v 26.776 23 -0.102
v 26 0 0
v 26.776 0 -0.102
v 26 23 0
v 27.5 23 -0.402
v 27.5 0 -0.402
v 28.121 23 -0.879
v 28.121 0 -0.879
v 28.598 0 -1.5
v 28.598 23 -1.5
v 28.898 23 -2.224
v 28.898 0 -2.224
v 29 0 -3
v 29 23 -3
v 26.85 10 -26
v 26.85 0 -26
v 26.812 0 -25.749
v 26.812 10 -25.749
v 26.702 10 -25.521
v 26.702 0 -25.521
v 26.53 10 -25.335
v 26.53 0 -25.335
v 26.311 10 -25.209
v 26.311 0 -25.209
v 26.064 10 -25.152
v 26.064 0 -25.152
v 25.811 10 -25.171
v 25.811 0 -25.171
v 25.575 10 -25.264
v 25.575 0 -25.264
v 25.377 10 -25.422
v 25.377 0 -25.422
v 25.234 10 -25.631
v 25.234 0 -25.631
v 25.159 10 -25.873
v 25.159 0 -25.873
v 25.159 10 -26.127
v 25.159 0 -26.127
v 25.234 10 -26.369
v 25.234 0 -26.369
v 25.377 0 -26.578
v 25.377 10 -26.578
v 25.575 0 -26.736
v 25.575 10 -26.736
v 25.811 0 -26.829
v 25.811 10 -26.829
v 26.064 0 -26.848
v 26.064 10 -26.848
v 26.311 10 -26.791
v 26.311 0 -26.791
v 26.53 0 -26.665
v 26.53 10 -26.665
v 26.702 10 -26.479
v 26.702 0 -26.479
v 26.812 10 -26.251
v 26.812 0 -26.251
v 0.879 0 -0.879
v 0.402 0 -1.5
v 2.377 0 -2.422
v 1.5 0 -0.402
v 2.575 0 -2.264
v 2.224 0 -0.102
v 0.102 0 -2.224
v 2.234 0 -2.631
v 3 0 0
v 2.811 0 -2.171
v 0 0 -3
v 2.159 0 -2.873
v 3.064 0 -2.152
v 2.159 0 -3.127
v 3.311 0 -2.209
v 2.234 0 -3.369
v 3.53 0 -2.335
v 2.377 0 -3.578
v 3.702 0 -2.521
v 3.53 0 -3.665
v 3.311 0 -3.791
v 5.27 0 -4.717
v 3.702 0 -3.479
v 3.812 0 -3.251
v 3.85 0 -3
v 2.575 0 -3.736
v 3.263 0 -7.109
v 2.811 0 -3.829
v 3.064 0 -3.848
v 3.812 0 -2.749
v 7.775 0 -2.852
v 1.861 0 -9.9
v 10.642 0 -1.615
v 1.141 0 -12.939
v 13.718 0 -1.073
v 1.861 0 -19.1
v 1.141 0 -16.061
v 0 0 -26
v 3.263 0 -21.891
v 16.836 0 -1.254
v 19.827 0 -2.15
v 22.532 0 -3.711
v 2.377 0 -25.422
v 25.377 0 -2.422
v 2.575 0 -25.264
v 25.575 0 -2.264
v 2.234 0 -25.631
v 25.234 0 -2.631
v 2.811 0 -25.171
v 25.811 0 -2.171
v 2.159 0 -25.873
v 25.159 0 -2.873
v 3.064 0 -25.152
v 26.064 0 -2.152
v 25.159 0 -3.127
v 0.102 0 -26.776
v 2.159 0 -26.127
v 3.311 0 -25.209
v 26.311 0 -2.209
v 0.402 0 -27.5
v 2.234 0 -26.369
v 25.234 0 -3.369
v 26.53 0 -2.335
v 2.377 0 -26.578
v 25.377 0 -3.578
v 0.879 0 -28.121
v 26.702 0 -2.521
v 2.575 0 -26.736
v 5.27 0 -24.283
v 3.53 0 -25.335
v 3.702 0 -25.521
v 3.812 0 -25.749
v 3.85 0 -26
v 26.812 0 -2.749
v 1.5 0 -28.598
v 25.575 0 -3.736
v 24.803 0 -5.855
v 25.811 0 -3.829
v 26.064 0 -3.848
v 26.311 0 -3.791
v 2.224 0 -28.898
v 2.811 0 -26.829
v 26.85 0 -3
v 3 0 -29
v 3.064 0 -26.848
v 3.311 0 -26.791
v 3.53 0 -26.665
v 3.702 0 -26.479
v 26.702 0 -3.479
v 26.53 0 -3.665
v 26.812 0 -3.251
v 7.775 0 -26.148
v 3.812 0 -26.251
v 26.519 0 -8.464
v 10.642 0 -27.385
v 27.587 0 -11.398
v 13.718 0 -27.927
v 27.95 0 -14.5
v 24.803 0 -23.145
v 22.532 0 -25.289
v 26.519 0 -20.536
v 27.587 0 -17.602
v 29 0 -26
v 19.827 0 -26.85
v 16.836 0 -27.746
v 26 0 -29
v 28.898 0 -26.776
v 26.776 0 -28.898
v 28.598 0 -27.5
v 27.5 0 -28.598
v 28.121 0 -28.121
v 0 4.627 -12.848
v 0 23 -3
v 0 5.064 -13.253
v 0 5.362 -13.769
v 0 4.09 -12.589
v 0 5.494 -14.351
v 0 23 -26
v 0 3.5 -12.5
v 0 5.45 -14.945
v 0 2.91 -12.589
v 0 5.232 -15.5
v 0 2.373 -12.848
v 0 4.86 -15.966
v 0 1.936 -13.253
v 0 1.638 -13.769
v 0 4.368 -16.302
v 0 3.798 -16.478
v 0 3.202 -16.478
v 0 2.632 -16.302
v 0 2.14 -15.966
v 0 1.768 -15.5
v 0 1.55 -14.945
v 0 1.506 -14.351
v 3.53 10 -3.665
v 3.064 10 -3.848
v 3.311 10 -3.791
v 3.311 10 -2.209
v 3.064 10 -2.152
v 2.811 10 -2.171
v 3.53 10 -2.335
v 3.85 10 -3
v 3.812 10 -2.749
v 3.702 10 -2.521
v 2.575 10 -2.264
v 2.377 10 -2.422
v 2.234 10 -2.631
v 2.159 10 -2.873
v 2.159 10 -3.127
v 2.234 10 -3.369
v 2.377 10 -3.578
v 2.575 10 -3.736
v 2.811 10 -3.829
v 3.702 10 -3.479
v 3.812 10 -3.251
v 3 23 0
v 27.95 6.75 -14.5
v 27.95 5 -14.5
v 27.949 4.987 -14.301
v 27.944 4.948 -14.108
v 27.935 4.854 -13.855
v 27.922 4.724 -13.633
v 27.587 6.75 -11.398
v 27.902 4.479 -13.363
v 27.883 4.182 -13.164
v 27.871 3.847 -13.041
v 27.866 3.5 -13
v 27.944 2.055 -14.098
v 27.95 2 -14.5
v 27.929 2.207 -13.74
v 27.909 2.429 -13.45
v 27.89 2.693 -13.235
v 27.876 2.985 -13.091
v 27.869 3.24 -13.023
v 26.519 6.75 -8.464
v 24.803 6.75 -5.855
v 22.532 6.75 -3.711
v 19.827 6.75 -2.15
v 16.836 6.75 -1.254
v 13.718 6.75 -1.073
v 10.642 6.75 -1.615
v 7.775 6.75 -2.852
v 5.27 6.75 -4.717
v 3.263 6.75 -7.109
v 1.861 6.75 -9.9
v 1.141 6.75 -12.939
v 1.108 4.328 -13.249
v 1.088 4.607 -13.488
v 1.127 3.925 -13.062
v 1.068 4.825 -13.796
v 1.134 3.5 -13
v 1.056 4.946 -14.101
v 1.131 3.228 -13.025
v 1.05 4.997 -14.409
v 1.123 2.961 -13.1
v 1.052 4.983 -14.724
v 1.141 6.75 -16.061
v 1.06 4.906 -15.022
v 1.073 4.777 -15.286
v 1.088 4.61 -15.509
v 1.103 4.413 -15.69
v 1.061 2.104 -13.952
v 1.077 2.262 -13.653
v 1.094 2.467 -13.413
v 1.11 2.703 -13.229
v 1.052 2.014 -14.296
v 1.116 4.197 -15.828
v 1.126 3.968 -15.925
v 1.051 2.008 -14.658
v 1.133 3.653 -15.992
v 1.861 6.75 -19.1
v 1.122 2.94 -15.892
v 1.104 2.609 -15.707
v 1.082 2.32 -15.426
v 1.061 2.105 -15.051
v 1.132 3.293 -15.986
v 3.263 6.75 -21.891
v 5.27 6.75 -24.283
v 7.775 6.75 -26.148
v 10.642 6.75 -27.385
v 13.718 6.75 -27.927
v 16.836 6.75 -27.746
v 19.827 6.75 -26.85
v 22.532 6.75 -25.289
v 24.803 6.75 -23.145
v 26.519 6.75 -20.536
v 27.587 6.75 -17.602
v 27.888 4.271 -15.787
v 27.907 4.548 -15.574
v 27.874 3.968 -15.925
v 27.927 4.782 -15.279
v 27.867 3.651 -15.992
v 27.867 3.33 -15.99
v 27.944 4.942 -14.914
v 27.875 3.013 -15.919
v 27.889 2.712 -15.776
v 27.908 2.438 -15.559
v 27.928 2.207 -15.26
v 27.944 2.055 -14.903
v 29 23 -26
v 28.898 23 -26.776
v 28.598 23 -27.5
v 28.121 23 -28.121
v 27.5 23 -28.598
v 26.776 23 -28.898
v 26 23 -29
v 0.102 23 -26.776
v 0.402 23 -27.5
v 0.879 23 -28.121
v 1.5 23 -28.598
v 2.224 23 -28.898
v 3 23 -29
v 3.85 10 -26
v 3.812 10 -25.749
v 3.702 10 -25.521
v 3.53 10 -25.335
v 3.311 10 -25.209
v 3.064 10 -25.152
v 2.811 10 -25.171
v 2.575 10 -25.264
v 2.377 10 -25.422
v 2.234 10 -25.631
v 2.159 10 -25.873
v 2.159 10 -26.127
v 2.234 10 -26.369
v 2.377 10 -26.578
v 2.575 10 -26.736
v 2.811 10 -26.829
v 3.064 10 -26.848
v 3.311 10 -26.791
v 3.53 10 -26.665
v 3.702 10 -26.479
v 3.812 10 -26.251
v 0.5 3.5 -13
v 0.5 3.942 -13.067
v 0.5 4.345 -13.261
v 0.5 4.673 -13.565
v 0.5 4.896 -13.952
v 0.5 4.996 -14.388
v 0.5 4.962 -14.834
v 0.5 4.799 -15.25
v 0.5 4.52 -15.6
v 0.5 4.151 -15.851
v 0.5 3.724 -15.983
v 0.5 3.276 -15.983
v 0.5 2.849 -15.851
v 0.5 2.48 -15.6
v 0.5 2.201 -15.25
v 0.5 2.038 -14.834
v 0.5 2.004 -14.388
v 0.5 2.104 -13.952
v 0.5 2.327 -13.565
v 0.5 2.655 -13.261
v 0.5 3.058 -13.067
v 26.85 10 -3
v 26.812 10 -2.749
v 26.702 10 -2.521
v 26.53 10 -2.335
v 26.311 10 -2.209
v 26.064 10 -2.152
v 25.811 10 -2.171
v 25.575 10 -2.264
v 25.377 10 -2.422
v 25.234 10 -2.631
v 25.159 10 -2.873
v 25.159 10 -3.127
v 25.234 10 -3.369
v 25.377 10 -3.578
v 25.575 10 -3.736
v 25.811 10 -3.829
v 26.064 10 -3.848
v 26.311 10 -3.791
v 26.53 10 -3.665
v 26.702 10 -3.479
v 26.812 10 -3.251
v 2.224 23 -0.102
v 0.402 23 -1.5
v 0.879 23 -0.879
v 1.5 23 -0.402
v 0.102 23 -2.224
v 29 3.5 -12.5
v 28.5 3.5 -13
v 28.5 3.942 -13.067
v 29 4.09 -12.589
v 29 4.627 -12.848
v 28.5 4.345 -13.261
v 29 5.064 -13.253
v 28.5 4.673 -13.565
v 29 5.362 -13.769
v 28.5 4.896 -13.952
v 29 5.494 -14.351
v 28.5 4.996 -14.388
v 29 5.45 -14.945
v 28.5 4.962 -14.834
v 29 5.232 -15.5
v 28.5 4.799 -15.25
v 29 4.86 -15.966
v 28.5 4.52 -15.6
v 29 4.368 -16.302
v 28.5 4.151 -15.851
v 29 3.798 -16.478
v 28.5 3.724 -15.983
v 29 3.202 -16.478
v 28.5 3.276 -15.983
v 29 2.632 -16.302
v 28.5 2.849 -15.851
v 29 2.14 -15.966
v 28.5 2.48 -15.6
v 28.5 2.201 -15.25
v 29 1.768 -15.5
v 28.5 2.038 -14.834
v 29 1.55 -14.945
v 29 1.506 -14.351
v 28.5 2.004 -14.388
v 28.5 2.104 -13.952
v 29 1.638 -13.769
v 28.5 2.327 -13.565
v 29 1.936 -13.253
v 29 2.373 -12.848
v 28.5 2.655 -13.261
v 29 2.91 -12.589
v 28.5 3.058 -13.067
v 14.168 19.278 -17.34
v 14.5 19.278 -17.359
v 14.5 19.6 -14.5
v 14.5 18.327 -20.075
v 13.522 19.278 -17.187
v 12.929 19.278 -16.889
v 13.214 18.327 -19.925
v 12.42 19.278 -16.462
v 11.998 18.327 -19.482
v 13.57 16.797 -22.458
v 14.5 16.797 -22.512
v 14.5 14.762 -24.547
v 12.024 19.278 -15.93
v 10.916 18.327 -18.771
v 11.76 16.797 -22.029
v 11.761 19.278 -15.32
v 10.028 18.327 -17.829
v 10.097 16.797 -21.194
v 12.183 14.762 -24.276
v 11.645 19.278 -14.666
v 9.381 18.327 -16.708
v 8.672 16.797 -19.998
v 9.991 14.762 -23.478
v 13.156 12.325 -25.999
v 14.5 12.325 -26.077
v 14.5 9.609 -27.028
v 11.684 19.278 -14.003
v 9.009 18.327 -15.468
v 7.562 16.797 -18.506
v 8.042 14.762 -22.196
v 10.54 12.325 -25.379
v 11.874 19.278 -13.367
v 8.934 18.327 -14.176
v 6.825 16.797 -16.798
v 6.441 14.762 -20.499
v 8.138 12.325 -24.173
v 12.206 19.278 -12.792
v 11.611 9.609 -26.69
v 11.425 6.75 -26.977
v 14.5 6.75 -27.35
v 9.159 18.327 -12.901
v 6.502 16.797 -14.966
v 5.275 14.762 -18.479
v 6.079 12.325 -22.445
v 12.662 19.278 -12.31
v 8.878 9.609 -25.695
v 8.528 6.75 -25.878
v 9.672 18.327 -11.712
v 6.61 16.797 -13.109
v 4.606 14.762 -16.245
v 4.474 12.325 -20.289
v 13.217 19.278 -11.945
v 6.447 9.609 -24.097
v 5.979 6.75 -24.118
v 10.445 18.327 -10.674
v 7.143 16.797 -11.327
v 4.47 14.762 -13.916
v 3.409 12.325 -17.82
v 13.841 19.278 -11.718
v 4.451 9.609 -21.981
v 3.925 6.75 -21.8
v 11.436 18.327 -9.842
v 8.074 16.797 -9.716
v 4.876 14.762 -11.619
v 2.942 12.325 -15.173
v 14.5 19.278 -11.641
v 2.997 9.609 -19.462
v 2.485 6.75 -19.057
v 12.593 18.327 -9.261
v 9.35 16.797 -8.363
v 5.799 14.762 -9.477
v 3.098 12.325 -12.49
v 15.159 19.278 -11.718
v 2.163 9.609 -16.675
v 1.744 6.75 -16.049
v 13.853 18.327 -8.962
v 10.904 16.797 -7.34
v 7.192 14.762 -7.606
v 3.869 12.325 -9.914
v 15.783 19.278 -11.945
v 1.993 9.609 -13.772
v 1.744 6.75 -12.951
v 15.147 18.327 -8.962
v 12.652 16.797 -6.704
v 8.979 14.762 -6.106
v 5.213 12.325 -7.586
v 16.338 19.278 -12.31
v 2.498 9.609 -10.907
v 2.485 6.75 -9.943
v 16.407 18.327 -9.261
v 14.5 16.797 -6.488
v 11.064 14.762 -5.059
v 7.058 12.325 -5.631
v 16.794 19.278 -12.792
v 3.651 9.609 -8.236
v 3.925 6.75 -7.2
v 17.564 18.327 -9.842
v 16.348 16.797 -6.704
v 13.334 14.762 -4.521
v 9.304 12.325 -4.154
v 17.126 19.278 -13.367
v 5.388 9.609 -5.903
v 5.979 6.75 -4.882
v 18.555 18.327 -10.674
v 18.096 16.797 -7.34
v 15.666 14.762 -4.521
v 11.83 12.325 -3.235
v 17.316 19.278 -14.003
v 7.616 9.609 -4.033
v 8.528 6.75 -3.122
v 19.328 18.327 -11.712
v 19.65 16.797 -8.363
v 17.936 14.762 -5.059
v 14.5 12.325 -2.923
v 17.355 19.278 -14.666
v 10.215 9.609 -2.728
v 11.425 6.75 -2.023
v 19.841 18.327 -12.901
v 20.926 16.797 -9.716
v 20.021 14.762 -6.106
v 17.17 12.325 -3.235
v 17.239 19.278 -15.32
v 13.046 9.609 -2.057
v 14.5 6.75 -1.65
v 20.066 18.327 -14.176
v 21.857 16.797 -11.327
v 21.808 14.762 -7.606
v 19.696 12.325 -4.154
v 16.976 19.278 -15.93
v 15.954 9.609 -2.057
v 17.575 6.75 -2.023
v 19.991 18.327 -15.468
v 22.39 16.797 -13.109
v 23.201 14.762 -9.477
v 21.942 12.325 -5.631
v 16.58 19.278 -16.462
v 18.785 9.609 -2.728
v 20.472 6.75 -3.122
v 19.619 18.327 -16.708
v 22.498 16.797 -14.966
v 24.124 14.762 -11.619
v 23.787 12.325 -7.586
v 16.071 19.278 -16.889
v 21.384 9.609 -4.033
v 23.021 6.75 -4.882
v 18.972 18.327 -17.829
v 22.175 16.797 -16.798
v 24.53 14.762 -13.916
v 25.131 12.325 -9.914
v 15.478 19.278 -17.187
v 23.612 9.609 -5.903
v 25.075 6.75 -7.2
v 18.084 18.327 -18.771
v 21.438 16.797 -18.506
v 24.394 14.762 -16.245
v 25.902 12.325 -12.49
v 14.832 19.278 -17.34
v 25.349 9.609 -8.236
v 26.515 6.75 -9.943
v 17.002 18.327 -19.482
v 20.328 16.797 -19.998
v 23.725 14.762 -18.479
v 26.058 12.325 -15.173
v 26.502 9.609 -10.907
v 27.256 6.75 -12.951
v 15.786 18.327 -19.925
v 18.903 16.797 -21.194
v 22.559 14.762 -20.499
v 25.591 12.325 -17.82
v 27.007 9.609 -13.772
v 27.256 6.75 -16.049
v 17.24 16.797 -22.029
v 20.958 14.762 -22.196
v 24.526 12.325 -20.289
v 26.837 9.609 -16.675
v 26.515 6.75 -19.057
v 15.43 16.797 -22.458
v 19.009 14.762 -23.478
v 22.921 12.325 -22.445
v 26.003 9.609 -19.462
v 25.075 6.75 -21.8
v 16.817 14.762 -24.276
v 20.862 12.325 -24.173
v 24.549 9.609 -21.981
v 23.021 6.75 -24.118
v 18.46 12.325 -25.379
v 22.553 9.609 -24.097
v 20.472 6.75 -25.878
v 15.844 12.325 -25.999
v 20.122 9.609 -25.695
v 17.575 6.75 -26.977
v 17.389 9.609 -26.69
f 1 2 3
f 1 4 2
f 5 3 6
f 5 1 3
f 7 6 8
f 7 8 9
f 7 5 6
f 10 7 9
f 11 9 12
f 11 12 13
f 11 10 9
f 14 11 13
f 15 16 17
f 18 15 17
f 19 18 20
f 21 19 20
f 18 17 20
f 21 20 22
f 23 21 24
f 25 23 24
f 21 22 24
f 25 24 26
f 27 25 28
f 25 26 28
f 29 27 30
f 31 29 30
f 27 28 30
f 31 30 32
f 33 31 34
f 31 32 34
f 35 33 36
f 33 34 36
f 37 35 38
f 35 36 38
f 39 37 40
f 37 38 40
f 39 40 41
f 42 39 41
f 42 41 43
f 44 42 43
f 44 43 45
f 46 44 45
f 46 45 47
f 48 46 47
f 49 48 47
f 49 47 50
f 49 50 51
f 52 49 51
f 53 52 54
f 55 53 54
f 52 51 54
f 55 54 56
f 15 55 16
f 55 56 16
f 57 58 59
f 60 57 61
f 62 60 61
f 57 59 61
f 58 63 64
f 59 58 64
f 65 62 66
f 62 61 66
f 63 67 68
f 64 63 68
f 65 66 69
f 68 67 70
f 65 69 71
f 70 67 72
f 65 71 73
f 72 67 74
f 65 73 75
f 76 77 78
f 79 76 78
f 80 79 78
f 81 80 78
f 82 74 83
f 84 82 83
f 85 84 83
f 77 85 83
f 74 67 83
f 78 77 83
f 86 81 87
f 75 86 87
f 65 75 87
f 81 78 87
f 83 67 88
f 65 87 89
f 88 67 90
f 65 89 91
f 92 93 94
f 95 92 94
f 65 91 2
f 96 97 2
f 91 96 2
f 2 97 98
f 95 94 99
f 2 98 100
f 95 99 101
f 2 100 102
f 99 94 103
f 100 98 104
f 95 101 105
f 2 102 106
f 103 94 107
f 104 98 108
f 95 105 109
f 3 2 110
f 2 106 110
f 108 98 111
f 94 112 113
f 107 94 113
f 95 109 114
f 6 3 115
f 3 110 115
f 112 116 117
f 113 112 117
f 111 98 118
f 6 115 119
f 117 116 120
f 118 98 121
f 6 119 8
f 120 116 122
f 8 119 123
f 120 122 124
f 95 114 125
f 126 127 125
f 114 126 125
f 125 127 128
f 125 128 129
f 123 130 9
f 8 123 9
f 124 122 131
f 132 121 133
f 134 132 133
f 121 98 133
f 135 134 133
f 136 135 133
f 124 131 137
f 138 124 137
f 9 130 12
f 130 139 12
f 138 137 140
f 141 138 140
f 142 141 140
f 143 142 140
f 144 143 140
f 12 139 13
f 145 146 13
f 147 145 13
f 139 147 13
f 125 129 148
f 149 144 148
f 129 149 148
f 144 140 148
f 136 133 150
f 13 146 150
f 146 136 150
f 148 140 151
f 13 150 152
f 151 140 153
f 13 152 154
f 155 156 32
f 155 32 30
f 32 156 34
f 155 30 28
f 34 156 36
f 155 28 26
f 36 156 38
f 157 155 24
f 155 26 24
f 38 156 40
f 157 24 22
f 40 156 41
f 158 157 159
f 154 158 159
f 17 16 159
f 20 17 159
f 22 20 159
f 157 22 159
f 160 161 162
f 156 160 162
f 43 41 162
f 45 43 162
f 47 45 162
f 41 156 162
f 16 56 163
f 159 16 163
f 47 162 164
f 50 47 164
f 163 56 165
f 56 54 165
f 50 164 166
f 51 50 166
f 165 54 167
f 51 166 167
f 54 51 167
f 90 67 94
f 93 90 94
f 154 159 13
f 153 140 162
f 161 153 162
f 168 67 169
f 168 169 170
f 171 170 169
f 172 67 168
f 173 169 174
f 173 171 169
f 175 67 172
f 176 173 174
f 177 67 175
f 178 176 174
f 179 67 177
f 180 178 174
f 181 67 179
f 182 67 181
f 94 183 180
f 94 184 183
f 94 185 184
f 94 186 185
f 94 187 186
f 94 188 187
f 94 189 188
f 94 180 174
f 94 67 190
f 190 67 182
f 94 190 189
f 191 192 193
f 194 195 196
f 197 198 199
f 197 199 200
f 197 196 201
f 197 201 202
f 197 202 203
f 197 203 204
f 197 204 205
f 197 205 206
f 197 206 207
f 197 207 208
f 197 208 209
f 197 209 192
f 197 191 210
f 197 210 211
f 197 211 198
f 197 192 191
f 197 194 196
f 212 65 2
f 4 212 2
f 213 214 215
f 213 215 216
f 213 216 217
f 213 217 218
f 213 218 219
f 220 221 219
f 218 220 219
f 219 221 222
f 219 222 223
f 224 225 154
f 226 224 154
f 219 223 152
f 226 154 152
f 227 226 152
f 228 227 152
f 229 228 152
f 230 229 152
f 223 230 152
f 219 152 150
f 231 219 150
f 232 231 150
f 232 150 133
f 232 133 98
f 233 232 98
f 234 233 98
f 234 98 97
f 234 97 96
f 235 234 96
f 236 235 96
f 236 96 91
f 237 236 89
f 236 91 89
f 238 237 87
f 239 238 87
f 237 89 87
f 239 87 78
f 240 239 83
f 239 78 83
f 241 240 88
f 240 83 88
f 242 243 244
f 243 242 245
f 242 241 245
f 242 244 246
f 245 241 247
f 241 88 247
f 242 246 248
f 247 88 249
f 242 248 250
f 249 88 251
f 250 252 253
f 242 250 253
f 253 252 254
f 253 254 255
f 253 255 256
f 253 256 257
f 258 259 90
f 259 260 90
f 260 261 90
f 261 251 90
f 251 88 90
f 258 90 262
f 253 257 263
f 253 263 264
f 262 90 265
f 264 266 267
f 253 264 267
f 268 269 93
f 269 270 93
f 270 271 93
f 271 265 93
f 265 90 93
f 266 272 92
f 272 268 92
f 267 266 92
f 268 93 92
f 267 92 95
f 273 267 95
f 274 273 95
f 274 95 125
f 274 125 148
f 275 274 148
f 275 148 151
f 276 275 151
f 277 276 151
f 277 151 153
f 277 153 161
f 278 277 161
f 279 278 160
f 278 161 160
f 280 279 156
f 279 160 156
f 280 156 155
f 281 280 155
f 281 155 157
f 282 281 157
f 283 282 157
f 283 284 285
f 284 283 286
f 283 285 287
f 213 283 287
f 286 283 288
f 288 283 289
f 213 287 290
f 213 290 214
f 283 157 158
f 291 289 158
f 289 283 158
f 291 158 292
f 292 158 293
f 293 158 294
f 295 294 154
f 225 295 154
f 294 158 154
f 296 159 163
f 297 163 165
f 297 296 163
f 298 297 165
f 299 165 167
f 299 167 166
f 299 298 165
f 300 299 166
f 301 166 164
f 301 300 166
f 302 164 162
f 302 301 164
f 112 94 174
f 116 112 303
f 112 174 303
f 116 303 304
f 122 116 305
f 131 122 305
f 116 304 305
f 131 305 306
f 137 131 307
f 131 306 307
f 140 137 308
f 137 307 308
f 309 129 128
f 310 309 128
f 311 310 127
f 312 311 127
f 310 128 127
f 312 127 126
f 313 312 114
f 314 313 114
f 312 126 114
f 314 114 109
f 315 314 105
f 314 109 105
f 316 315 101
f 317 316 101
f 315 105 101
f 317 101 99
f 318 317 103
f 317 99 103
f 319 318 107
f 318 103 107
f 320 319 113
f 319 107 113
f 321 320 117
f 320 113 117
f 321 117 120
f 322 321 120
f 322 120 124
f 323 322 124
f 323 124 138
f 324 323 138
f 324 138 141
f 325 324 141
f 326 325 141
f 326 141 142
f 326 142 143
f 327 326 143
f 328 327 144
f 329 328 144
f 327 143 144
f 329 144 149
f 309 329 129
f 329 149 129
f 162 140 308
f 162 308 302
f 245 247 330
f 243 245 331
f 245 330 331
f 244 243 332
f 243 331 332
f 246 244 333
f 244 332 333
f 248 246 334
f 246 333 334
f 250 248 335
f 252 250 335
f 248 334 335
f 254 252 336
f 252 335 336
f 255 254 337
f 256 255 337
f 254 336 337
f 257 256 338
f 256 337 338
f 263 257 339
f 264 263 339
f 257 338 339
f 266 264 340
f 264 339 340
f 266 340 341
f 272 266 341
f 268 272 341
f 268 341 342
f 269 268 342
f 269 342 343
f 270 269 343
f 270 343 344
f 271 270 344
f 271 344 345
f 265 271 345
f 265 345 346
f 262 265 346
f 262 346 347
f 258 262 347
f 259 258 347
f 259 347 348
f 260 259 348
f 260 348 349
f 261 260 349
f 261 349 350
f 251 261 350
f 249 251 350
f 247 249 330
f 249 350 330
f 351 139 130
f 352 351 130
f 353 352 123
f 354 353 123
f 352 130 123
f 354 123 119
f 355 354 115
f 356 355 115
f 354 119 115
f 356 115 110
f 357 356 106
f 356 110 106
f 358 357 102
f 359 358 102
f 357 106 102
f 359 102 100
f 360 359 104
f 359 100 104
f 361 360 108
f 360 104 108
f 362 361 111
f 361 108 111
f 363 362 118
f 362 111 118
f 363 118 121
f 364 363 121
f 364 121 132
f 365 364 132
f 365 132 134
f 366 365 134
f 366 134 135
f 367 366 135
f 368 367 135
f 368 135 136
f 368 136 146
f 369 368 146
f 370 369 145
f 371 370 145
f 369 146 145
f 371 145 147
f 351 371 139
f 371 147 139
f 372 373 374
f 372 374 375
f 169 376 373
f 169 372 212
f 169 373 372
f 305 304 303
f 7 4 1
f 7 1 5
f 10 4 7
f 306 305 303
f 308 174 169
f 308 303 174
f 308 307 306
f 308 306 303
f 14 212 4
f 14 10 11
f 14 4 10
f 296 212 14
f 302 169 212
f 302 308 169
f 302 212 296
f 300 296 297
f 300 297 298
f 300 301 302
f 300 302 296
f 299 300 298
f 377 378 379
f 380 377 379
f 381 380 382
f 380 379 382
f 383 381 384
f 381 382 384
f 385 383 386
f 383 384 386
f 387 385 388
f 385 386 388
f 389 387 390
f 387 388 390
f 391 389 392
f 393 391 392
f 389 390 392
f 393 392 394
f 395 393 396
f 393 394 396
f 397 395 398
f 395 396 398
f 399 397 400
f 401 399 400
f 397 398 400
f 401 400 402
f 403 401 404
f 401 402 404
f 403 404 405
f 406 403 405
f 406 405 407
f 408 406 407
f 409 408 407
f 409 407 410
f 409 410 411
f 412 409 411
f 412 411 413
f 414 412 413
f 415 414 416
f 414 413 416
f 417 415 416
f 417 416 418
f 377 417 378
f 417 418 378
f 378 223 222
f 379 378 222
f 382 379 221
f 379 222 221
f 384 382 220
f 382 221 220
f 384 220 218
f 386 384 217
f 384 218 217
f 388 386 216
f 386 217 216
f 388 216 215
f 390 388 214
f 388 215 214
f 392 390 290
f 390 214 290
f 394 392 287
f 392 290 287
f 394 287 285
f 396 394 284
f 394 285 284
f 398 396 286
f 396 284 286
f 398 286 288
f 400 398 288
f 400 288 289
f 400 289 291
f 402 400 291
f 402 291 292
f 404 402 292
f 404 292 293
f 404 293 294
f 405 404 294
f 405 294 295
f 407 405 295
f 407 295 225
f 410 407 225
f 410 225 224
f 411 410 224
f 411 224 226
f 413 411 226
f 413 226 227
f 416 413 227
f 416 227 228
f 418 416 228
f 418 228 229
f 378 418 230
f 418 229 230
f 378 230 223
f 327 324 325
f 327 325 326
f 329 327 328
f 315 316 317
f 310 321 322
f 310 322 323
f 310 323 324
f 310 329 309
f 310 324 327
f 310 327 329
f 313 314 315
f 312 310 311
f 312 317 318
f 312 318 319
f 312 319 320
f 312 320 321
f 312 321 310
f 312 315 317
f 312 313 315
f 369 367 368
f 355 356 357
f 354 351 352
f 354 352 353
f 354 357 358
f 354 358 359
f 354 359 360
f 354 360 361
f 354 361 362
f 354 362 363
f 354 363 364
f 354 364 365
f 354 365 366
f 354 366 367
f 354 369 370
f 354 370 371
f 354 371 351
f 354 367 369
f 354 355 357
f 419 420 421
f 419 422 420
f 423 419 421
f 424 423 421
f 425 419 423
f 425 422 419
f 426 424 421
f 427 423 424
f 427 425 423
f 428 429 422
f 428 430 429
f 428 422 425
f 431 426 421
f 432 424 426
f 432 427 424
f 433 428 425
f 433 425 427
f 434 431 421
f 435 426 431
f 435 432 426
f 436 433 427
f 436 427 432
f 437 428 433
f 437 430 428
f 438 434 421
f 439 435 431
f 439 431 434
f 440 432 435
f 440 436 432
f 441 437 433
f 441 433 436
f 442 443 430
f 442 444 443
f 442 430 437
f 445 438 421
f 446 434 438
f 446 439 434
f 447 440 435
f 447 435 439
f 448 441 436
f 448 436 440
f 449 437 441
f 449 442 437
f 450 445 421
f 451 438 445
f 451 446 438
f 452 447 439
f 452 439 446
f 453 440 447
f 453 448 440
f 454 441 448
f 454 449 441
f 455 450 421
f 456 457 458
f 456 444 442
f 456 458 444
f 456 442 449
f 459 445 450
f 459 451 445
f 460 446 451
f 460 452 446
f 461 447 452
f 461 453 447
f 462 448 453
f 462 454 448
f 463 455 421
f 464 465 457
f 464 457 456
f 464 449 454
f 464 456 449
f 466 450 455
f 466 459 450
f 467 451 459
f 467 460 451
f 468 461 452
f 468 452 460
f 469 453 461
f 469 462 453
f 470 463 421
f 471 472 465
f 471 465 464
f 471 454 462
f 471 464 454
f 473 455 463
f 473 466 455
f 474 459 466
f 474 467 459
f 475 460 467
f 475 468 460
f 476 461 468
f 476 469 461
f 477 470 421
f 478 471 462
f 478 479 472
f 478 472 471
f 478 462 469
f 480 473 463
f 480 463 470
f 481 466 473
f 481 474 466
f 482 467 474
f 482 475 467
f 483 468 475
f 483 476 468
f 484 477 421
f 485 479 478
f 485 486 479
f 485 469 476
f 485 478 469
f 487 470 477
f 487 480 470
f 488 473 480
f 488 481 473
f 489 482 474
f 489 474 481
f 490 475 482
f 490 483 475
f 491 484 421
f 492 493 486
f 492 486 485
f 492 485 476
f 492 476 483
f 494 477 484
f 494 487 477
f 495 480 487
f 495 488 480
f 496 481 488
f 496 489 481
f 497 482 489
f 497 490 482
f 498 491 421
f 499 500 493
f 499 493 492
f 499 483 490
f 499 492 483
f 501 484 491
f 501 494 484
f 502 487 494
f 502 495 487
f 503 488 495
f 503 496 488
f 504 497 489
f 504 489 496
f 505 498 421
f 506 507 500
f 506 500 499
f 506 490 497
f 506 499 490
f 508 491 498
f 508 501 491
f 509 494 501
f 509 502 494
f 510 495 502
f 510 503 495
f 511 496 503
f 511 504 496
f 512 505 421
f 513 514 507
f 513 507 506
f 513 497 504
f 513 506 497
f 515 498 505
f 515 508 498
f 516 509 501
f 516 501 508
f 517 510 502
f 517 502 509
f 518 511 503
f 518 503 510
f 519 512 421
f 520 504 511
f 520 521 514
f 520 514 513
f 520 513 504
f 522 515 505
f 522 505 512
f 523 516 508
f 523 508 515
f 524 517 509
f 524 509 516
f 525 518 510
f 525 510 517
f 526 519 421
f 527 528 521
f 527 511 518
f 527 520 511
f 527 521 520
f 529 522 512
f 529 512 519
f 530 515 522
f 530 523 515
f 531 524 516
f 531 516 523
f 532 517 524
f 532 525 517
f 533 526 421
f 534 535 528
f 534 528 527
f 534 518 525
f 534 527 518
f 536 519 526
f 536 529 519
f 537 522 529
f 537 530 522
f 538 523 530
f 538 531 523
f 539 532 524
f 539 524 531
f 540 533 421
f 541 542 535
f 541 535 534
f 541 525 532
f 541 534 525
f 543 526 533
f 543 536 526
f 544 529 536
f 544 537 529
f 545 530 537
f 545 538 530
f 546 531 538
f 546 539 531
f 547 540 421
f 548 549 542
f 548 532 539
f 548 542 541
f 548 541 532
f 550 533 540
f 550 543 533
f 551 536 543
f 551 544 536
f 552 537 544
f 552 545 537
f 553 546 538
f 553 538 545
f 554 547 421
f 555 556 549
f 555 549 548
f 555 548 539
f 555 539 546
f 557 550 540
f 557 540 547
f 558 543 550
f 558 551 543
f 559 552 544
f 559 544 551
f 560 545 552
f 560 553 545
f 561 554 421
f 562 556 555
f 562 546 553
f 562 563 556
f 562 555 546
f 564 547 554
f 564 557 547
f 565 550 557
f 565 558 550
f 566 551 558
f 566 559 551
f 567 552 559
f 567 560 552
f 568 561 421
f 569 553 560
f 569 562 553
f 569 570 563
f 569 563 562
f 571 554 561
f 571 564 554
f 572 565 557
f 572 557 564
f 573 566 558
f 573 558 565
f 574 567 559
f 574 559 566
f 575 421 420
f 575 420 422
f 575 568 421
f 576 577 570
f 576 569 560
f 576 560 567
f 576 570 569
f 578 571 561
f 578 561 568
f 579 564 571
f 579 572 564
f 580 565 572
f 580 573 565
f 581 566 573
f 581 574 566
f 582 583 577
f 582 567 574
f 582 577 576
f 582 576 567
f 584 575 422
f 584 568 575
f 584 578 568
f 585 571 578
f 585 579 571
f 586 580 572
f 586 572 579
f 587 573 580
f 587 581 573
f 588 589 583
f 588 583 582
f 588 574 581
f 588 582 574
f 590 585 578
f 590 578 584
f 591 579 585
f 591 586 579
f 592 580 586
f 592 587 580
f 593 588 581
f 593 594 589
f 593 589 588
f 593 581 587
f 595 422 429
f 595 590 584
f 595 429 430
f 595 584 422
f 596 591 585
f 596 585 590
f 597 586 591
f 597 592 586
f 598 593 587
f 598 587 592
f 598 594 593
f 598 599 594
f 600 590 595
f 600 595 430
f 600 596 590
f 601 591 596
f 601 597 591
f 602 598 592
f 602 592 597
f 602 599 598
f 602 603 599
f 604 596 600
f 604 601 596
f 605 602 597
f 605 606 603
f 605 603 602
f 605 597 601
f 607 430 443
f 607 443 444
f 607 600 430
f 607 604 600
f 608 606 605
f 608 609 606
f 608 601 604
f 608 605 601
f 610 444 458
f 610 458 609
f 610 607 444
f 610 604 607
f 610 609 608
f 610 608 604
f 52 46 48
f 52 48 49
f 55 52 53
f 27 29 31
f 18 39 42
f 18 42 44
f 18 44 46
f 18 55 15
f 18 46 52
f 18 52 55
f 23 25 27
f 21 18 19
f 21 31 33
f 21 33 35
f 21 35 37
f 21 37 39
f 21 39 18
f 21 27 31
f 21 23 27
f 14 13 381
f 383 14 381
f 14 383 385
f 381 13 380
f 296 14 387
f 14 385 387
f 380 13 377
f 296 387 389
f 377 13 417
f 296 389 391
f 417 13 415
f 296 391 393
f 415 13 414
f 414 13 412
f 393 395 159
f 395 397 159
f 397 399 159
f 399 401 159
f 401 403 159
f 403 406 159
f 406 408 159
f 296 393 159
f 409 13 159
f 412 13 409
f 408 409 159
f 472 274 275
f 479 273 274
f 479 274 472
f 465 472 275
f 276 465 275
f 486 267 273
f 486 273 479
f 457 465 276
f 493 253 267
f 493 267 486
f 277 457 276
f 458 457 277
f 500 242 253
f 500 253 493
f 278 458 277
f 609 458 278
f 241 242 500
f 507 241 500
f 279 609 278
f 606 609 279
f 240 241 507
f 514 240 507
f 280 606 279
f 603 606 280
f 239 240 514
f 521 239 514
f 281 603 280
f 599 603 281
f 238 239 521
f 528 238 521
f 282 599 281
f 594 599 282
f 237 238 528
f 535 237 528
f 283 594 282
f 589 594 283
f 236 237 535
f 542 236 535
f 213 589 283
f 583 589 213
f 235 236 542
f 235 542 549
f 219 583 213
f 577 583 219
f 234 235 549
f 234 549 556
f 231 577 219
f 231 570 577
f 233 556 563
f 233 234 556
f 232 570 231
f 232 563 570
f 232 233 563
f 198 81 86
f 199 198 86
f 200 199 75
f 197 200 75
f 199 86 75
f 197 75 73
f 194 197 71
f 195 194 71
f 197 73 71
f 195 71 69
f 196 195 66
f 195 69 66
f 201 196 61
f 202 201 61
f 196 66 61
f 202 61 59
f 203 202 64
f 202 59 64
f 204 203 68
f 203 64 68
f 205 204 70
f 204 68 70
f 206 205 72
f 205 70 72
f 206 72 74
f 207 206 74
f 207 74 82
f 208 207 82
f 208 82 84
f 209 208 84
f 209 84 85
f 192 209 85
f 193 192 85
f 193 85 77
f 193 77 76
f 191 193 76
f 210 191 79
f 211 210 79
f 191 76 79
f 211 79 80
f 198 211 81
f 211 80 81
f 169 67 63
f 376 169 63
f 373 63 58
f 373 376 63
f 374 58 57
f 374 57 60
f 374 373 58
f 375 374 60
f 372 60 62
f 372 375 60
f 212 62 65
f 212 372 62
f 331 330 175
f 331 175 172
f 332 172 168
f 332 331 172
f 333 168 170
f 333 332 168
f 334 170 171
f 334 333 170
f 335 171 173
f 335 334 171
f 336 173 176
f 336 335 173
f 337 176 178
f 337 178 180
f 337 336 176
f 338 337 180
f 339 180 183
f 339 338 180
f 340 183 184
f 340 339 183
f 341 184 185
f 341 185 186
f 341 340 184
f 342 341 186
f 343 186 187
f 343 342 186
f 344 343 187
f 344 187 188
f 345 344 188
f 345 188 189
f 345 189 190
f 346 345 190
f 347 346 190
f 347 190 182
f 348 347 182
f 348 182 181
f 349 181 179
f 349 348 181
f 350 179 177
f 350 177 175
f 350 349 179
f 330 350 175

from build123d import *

# Parameters (mm, degrees)
SKETCH1_W           = 29
SKETCH1_H           = 29
BOSS_EXTRUDE1_DEPTH = 23
FILLET1_R           = 3
SKETCH2_R           = 13.45
CUT_EXTRUDE1_DEPTH  = 6.75
SKETCH7_R           = 0.85
CUT_EXTRUDE2_DEPTH  = 10
SKETCH8_R           = 1.5
CUT_EXTRUDE3_DEPTH  = 30
CHAMFER1_SIZE       = 0.5


with BuildPart() as part:
    # Sketch1 → Boss-Extrude1 (new body)
    with BuildSketch(Plane(origin=(0, 0, 0), x_dir=(1, 0, 0), z_dir=(0, 1, 0))):
        with Locations((14.5, 14.5)):
            Rectangle(SKETCH1_W, SKETCH1_H)
    extrude(amount=BOSS_EXTRUDE1_DEPTH)

    # Fillet1
    fillet1_edges = [part.edges().sort_by_distance(p)[0] for p in [
        (0, 11.5, -29),
        (29, 11.5, -29),
        (29, 11.5, 0),
        (0, 11.5, 0),
    ]]
    fillet(fillet1_edges, radius=FILLET1_R)

    # Sketch2 → Cut-Extrude1 (cut)
    with BuildSketch(Plane.XZ):
        with Locations((14.5, -14.5)):
            Circle(SKETCH2_R)
    extrude(amount=-CUT_EXTRUDE1_DEPTH, mode=Mode.SUBTRACT)

    # Sketch6 → Cut-Revolve1 (revolve, cut)
    with BuildSketch(Plane(origin=(14.5, 0, 0), x_dir=(0, 0, -1), z_dir=(1, 0, 0))):
        with BuildLine():
            Line((14.5, 6.75), (14.5, 19.6))
            ThreePointArc((14.5, 19.6), (23.586322138, 15.836322138), (27.35, 6.75))
            Line((27.35, 6.75), (14.5, 6.75))
        make_face()
    revolve(axis=Axis((14.5, 6.75, -14.5), (0, 1, 0)), mode=Mode.SUBTRACT)

    # Sketch7 → Cut-Extrude2 (cut)
    with BuildSketch(Plane.XZ):
        with Locations((3, -3)):
            Circle(SKETCH7_R)
        with Locations((26, -3)):
            Circle(SKETCH7_R)
        with Locations((26, -26)):
            Circle(SKETCH7_R)
        with Locations((3, -26)):
            Circle(SKETCH7_R)
    extrude(amount=-CUT_EXTRUDE2_DEPTH, mode=Mode.SUBTRACT)

    # Sketch8 → Cut-Extrude3 (cut, through all)
    with BuildSketch(Plane.ZY):
        with Locations((-14.5, 3.5)):
            Circle(SKETCH8_R)
    extrude(amount=-CUT_EXTRUDE3_DEPTH, mode=Mode.SUBTRACT)

    # Chamfer1
    chamfer1_edges = [part.edges().sort_by_distance(p)[0] for p in [
        (29, 3.5, -16),
        (0, 3.5, -16),
    ]]
    chamfer(chamfer1_edges, length=CHAMFER1_SIZE)


solid = part.part
